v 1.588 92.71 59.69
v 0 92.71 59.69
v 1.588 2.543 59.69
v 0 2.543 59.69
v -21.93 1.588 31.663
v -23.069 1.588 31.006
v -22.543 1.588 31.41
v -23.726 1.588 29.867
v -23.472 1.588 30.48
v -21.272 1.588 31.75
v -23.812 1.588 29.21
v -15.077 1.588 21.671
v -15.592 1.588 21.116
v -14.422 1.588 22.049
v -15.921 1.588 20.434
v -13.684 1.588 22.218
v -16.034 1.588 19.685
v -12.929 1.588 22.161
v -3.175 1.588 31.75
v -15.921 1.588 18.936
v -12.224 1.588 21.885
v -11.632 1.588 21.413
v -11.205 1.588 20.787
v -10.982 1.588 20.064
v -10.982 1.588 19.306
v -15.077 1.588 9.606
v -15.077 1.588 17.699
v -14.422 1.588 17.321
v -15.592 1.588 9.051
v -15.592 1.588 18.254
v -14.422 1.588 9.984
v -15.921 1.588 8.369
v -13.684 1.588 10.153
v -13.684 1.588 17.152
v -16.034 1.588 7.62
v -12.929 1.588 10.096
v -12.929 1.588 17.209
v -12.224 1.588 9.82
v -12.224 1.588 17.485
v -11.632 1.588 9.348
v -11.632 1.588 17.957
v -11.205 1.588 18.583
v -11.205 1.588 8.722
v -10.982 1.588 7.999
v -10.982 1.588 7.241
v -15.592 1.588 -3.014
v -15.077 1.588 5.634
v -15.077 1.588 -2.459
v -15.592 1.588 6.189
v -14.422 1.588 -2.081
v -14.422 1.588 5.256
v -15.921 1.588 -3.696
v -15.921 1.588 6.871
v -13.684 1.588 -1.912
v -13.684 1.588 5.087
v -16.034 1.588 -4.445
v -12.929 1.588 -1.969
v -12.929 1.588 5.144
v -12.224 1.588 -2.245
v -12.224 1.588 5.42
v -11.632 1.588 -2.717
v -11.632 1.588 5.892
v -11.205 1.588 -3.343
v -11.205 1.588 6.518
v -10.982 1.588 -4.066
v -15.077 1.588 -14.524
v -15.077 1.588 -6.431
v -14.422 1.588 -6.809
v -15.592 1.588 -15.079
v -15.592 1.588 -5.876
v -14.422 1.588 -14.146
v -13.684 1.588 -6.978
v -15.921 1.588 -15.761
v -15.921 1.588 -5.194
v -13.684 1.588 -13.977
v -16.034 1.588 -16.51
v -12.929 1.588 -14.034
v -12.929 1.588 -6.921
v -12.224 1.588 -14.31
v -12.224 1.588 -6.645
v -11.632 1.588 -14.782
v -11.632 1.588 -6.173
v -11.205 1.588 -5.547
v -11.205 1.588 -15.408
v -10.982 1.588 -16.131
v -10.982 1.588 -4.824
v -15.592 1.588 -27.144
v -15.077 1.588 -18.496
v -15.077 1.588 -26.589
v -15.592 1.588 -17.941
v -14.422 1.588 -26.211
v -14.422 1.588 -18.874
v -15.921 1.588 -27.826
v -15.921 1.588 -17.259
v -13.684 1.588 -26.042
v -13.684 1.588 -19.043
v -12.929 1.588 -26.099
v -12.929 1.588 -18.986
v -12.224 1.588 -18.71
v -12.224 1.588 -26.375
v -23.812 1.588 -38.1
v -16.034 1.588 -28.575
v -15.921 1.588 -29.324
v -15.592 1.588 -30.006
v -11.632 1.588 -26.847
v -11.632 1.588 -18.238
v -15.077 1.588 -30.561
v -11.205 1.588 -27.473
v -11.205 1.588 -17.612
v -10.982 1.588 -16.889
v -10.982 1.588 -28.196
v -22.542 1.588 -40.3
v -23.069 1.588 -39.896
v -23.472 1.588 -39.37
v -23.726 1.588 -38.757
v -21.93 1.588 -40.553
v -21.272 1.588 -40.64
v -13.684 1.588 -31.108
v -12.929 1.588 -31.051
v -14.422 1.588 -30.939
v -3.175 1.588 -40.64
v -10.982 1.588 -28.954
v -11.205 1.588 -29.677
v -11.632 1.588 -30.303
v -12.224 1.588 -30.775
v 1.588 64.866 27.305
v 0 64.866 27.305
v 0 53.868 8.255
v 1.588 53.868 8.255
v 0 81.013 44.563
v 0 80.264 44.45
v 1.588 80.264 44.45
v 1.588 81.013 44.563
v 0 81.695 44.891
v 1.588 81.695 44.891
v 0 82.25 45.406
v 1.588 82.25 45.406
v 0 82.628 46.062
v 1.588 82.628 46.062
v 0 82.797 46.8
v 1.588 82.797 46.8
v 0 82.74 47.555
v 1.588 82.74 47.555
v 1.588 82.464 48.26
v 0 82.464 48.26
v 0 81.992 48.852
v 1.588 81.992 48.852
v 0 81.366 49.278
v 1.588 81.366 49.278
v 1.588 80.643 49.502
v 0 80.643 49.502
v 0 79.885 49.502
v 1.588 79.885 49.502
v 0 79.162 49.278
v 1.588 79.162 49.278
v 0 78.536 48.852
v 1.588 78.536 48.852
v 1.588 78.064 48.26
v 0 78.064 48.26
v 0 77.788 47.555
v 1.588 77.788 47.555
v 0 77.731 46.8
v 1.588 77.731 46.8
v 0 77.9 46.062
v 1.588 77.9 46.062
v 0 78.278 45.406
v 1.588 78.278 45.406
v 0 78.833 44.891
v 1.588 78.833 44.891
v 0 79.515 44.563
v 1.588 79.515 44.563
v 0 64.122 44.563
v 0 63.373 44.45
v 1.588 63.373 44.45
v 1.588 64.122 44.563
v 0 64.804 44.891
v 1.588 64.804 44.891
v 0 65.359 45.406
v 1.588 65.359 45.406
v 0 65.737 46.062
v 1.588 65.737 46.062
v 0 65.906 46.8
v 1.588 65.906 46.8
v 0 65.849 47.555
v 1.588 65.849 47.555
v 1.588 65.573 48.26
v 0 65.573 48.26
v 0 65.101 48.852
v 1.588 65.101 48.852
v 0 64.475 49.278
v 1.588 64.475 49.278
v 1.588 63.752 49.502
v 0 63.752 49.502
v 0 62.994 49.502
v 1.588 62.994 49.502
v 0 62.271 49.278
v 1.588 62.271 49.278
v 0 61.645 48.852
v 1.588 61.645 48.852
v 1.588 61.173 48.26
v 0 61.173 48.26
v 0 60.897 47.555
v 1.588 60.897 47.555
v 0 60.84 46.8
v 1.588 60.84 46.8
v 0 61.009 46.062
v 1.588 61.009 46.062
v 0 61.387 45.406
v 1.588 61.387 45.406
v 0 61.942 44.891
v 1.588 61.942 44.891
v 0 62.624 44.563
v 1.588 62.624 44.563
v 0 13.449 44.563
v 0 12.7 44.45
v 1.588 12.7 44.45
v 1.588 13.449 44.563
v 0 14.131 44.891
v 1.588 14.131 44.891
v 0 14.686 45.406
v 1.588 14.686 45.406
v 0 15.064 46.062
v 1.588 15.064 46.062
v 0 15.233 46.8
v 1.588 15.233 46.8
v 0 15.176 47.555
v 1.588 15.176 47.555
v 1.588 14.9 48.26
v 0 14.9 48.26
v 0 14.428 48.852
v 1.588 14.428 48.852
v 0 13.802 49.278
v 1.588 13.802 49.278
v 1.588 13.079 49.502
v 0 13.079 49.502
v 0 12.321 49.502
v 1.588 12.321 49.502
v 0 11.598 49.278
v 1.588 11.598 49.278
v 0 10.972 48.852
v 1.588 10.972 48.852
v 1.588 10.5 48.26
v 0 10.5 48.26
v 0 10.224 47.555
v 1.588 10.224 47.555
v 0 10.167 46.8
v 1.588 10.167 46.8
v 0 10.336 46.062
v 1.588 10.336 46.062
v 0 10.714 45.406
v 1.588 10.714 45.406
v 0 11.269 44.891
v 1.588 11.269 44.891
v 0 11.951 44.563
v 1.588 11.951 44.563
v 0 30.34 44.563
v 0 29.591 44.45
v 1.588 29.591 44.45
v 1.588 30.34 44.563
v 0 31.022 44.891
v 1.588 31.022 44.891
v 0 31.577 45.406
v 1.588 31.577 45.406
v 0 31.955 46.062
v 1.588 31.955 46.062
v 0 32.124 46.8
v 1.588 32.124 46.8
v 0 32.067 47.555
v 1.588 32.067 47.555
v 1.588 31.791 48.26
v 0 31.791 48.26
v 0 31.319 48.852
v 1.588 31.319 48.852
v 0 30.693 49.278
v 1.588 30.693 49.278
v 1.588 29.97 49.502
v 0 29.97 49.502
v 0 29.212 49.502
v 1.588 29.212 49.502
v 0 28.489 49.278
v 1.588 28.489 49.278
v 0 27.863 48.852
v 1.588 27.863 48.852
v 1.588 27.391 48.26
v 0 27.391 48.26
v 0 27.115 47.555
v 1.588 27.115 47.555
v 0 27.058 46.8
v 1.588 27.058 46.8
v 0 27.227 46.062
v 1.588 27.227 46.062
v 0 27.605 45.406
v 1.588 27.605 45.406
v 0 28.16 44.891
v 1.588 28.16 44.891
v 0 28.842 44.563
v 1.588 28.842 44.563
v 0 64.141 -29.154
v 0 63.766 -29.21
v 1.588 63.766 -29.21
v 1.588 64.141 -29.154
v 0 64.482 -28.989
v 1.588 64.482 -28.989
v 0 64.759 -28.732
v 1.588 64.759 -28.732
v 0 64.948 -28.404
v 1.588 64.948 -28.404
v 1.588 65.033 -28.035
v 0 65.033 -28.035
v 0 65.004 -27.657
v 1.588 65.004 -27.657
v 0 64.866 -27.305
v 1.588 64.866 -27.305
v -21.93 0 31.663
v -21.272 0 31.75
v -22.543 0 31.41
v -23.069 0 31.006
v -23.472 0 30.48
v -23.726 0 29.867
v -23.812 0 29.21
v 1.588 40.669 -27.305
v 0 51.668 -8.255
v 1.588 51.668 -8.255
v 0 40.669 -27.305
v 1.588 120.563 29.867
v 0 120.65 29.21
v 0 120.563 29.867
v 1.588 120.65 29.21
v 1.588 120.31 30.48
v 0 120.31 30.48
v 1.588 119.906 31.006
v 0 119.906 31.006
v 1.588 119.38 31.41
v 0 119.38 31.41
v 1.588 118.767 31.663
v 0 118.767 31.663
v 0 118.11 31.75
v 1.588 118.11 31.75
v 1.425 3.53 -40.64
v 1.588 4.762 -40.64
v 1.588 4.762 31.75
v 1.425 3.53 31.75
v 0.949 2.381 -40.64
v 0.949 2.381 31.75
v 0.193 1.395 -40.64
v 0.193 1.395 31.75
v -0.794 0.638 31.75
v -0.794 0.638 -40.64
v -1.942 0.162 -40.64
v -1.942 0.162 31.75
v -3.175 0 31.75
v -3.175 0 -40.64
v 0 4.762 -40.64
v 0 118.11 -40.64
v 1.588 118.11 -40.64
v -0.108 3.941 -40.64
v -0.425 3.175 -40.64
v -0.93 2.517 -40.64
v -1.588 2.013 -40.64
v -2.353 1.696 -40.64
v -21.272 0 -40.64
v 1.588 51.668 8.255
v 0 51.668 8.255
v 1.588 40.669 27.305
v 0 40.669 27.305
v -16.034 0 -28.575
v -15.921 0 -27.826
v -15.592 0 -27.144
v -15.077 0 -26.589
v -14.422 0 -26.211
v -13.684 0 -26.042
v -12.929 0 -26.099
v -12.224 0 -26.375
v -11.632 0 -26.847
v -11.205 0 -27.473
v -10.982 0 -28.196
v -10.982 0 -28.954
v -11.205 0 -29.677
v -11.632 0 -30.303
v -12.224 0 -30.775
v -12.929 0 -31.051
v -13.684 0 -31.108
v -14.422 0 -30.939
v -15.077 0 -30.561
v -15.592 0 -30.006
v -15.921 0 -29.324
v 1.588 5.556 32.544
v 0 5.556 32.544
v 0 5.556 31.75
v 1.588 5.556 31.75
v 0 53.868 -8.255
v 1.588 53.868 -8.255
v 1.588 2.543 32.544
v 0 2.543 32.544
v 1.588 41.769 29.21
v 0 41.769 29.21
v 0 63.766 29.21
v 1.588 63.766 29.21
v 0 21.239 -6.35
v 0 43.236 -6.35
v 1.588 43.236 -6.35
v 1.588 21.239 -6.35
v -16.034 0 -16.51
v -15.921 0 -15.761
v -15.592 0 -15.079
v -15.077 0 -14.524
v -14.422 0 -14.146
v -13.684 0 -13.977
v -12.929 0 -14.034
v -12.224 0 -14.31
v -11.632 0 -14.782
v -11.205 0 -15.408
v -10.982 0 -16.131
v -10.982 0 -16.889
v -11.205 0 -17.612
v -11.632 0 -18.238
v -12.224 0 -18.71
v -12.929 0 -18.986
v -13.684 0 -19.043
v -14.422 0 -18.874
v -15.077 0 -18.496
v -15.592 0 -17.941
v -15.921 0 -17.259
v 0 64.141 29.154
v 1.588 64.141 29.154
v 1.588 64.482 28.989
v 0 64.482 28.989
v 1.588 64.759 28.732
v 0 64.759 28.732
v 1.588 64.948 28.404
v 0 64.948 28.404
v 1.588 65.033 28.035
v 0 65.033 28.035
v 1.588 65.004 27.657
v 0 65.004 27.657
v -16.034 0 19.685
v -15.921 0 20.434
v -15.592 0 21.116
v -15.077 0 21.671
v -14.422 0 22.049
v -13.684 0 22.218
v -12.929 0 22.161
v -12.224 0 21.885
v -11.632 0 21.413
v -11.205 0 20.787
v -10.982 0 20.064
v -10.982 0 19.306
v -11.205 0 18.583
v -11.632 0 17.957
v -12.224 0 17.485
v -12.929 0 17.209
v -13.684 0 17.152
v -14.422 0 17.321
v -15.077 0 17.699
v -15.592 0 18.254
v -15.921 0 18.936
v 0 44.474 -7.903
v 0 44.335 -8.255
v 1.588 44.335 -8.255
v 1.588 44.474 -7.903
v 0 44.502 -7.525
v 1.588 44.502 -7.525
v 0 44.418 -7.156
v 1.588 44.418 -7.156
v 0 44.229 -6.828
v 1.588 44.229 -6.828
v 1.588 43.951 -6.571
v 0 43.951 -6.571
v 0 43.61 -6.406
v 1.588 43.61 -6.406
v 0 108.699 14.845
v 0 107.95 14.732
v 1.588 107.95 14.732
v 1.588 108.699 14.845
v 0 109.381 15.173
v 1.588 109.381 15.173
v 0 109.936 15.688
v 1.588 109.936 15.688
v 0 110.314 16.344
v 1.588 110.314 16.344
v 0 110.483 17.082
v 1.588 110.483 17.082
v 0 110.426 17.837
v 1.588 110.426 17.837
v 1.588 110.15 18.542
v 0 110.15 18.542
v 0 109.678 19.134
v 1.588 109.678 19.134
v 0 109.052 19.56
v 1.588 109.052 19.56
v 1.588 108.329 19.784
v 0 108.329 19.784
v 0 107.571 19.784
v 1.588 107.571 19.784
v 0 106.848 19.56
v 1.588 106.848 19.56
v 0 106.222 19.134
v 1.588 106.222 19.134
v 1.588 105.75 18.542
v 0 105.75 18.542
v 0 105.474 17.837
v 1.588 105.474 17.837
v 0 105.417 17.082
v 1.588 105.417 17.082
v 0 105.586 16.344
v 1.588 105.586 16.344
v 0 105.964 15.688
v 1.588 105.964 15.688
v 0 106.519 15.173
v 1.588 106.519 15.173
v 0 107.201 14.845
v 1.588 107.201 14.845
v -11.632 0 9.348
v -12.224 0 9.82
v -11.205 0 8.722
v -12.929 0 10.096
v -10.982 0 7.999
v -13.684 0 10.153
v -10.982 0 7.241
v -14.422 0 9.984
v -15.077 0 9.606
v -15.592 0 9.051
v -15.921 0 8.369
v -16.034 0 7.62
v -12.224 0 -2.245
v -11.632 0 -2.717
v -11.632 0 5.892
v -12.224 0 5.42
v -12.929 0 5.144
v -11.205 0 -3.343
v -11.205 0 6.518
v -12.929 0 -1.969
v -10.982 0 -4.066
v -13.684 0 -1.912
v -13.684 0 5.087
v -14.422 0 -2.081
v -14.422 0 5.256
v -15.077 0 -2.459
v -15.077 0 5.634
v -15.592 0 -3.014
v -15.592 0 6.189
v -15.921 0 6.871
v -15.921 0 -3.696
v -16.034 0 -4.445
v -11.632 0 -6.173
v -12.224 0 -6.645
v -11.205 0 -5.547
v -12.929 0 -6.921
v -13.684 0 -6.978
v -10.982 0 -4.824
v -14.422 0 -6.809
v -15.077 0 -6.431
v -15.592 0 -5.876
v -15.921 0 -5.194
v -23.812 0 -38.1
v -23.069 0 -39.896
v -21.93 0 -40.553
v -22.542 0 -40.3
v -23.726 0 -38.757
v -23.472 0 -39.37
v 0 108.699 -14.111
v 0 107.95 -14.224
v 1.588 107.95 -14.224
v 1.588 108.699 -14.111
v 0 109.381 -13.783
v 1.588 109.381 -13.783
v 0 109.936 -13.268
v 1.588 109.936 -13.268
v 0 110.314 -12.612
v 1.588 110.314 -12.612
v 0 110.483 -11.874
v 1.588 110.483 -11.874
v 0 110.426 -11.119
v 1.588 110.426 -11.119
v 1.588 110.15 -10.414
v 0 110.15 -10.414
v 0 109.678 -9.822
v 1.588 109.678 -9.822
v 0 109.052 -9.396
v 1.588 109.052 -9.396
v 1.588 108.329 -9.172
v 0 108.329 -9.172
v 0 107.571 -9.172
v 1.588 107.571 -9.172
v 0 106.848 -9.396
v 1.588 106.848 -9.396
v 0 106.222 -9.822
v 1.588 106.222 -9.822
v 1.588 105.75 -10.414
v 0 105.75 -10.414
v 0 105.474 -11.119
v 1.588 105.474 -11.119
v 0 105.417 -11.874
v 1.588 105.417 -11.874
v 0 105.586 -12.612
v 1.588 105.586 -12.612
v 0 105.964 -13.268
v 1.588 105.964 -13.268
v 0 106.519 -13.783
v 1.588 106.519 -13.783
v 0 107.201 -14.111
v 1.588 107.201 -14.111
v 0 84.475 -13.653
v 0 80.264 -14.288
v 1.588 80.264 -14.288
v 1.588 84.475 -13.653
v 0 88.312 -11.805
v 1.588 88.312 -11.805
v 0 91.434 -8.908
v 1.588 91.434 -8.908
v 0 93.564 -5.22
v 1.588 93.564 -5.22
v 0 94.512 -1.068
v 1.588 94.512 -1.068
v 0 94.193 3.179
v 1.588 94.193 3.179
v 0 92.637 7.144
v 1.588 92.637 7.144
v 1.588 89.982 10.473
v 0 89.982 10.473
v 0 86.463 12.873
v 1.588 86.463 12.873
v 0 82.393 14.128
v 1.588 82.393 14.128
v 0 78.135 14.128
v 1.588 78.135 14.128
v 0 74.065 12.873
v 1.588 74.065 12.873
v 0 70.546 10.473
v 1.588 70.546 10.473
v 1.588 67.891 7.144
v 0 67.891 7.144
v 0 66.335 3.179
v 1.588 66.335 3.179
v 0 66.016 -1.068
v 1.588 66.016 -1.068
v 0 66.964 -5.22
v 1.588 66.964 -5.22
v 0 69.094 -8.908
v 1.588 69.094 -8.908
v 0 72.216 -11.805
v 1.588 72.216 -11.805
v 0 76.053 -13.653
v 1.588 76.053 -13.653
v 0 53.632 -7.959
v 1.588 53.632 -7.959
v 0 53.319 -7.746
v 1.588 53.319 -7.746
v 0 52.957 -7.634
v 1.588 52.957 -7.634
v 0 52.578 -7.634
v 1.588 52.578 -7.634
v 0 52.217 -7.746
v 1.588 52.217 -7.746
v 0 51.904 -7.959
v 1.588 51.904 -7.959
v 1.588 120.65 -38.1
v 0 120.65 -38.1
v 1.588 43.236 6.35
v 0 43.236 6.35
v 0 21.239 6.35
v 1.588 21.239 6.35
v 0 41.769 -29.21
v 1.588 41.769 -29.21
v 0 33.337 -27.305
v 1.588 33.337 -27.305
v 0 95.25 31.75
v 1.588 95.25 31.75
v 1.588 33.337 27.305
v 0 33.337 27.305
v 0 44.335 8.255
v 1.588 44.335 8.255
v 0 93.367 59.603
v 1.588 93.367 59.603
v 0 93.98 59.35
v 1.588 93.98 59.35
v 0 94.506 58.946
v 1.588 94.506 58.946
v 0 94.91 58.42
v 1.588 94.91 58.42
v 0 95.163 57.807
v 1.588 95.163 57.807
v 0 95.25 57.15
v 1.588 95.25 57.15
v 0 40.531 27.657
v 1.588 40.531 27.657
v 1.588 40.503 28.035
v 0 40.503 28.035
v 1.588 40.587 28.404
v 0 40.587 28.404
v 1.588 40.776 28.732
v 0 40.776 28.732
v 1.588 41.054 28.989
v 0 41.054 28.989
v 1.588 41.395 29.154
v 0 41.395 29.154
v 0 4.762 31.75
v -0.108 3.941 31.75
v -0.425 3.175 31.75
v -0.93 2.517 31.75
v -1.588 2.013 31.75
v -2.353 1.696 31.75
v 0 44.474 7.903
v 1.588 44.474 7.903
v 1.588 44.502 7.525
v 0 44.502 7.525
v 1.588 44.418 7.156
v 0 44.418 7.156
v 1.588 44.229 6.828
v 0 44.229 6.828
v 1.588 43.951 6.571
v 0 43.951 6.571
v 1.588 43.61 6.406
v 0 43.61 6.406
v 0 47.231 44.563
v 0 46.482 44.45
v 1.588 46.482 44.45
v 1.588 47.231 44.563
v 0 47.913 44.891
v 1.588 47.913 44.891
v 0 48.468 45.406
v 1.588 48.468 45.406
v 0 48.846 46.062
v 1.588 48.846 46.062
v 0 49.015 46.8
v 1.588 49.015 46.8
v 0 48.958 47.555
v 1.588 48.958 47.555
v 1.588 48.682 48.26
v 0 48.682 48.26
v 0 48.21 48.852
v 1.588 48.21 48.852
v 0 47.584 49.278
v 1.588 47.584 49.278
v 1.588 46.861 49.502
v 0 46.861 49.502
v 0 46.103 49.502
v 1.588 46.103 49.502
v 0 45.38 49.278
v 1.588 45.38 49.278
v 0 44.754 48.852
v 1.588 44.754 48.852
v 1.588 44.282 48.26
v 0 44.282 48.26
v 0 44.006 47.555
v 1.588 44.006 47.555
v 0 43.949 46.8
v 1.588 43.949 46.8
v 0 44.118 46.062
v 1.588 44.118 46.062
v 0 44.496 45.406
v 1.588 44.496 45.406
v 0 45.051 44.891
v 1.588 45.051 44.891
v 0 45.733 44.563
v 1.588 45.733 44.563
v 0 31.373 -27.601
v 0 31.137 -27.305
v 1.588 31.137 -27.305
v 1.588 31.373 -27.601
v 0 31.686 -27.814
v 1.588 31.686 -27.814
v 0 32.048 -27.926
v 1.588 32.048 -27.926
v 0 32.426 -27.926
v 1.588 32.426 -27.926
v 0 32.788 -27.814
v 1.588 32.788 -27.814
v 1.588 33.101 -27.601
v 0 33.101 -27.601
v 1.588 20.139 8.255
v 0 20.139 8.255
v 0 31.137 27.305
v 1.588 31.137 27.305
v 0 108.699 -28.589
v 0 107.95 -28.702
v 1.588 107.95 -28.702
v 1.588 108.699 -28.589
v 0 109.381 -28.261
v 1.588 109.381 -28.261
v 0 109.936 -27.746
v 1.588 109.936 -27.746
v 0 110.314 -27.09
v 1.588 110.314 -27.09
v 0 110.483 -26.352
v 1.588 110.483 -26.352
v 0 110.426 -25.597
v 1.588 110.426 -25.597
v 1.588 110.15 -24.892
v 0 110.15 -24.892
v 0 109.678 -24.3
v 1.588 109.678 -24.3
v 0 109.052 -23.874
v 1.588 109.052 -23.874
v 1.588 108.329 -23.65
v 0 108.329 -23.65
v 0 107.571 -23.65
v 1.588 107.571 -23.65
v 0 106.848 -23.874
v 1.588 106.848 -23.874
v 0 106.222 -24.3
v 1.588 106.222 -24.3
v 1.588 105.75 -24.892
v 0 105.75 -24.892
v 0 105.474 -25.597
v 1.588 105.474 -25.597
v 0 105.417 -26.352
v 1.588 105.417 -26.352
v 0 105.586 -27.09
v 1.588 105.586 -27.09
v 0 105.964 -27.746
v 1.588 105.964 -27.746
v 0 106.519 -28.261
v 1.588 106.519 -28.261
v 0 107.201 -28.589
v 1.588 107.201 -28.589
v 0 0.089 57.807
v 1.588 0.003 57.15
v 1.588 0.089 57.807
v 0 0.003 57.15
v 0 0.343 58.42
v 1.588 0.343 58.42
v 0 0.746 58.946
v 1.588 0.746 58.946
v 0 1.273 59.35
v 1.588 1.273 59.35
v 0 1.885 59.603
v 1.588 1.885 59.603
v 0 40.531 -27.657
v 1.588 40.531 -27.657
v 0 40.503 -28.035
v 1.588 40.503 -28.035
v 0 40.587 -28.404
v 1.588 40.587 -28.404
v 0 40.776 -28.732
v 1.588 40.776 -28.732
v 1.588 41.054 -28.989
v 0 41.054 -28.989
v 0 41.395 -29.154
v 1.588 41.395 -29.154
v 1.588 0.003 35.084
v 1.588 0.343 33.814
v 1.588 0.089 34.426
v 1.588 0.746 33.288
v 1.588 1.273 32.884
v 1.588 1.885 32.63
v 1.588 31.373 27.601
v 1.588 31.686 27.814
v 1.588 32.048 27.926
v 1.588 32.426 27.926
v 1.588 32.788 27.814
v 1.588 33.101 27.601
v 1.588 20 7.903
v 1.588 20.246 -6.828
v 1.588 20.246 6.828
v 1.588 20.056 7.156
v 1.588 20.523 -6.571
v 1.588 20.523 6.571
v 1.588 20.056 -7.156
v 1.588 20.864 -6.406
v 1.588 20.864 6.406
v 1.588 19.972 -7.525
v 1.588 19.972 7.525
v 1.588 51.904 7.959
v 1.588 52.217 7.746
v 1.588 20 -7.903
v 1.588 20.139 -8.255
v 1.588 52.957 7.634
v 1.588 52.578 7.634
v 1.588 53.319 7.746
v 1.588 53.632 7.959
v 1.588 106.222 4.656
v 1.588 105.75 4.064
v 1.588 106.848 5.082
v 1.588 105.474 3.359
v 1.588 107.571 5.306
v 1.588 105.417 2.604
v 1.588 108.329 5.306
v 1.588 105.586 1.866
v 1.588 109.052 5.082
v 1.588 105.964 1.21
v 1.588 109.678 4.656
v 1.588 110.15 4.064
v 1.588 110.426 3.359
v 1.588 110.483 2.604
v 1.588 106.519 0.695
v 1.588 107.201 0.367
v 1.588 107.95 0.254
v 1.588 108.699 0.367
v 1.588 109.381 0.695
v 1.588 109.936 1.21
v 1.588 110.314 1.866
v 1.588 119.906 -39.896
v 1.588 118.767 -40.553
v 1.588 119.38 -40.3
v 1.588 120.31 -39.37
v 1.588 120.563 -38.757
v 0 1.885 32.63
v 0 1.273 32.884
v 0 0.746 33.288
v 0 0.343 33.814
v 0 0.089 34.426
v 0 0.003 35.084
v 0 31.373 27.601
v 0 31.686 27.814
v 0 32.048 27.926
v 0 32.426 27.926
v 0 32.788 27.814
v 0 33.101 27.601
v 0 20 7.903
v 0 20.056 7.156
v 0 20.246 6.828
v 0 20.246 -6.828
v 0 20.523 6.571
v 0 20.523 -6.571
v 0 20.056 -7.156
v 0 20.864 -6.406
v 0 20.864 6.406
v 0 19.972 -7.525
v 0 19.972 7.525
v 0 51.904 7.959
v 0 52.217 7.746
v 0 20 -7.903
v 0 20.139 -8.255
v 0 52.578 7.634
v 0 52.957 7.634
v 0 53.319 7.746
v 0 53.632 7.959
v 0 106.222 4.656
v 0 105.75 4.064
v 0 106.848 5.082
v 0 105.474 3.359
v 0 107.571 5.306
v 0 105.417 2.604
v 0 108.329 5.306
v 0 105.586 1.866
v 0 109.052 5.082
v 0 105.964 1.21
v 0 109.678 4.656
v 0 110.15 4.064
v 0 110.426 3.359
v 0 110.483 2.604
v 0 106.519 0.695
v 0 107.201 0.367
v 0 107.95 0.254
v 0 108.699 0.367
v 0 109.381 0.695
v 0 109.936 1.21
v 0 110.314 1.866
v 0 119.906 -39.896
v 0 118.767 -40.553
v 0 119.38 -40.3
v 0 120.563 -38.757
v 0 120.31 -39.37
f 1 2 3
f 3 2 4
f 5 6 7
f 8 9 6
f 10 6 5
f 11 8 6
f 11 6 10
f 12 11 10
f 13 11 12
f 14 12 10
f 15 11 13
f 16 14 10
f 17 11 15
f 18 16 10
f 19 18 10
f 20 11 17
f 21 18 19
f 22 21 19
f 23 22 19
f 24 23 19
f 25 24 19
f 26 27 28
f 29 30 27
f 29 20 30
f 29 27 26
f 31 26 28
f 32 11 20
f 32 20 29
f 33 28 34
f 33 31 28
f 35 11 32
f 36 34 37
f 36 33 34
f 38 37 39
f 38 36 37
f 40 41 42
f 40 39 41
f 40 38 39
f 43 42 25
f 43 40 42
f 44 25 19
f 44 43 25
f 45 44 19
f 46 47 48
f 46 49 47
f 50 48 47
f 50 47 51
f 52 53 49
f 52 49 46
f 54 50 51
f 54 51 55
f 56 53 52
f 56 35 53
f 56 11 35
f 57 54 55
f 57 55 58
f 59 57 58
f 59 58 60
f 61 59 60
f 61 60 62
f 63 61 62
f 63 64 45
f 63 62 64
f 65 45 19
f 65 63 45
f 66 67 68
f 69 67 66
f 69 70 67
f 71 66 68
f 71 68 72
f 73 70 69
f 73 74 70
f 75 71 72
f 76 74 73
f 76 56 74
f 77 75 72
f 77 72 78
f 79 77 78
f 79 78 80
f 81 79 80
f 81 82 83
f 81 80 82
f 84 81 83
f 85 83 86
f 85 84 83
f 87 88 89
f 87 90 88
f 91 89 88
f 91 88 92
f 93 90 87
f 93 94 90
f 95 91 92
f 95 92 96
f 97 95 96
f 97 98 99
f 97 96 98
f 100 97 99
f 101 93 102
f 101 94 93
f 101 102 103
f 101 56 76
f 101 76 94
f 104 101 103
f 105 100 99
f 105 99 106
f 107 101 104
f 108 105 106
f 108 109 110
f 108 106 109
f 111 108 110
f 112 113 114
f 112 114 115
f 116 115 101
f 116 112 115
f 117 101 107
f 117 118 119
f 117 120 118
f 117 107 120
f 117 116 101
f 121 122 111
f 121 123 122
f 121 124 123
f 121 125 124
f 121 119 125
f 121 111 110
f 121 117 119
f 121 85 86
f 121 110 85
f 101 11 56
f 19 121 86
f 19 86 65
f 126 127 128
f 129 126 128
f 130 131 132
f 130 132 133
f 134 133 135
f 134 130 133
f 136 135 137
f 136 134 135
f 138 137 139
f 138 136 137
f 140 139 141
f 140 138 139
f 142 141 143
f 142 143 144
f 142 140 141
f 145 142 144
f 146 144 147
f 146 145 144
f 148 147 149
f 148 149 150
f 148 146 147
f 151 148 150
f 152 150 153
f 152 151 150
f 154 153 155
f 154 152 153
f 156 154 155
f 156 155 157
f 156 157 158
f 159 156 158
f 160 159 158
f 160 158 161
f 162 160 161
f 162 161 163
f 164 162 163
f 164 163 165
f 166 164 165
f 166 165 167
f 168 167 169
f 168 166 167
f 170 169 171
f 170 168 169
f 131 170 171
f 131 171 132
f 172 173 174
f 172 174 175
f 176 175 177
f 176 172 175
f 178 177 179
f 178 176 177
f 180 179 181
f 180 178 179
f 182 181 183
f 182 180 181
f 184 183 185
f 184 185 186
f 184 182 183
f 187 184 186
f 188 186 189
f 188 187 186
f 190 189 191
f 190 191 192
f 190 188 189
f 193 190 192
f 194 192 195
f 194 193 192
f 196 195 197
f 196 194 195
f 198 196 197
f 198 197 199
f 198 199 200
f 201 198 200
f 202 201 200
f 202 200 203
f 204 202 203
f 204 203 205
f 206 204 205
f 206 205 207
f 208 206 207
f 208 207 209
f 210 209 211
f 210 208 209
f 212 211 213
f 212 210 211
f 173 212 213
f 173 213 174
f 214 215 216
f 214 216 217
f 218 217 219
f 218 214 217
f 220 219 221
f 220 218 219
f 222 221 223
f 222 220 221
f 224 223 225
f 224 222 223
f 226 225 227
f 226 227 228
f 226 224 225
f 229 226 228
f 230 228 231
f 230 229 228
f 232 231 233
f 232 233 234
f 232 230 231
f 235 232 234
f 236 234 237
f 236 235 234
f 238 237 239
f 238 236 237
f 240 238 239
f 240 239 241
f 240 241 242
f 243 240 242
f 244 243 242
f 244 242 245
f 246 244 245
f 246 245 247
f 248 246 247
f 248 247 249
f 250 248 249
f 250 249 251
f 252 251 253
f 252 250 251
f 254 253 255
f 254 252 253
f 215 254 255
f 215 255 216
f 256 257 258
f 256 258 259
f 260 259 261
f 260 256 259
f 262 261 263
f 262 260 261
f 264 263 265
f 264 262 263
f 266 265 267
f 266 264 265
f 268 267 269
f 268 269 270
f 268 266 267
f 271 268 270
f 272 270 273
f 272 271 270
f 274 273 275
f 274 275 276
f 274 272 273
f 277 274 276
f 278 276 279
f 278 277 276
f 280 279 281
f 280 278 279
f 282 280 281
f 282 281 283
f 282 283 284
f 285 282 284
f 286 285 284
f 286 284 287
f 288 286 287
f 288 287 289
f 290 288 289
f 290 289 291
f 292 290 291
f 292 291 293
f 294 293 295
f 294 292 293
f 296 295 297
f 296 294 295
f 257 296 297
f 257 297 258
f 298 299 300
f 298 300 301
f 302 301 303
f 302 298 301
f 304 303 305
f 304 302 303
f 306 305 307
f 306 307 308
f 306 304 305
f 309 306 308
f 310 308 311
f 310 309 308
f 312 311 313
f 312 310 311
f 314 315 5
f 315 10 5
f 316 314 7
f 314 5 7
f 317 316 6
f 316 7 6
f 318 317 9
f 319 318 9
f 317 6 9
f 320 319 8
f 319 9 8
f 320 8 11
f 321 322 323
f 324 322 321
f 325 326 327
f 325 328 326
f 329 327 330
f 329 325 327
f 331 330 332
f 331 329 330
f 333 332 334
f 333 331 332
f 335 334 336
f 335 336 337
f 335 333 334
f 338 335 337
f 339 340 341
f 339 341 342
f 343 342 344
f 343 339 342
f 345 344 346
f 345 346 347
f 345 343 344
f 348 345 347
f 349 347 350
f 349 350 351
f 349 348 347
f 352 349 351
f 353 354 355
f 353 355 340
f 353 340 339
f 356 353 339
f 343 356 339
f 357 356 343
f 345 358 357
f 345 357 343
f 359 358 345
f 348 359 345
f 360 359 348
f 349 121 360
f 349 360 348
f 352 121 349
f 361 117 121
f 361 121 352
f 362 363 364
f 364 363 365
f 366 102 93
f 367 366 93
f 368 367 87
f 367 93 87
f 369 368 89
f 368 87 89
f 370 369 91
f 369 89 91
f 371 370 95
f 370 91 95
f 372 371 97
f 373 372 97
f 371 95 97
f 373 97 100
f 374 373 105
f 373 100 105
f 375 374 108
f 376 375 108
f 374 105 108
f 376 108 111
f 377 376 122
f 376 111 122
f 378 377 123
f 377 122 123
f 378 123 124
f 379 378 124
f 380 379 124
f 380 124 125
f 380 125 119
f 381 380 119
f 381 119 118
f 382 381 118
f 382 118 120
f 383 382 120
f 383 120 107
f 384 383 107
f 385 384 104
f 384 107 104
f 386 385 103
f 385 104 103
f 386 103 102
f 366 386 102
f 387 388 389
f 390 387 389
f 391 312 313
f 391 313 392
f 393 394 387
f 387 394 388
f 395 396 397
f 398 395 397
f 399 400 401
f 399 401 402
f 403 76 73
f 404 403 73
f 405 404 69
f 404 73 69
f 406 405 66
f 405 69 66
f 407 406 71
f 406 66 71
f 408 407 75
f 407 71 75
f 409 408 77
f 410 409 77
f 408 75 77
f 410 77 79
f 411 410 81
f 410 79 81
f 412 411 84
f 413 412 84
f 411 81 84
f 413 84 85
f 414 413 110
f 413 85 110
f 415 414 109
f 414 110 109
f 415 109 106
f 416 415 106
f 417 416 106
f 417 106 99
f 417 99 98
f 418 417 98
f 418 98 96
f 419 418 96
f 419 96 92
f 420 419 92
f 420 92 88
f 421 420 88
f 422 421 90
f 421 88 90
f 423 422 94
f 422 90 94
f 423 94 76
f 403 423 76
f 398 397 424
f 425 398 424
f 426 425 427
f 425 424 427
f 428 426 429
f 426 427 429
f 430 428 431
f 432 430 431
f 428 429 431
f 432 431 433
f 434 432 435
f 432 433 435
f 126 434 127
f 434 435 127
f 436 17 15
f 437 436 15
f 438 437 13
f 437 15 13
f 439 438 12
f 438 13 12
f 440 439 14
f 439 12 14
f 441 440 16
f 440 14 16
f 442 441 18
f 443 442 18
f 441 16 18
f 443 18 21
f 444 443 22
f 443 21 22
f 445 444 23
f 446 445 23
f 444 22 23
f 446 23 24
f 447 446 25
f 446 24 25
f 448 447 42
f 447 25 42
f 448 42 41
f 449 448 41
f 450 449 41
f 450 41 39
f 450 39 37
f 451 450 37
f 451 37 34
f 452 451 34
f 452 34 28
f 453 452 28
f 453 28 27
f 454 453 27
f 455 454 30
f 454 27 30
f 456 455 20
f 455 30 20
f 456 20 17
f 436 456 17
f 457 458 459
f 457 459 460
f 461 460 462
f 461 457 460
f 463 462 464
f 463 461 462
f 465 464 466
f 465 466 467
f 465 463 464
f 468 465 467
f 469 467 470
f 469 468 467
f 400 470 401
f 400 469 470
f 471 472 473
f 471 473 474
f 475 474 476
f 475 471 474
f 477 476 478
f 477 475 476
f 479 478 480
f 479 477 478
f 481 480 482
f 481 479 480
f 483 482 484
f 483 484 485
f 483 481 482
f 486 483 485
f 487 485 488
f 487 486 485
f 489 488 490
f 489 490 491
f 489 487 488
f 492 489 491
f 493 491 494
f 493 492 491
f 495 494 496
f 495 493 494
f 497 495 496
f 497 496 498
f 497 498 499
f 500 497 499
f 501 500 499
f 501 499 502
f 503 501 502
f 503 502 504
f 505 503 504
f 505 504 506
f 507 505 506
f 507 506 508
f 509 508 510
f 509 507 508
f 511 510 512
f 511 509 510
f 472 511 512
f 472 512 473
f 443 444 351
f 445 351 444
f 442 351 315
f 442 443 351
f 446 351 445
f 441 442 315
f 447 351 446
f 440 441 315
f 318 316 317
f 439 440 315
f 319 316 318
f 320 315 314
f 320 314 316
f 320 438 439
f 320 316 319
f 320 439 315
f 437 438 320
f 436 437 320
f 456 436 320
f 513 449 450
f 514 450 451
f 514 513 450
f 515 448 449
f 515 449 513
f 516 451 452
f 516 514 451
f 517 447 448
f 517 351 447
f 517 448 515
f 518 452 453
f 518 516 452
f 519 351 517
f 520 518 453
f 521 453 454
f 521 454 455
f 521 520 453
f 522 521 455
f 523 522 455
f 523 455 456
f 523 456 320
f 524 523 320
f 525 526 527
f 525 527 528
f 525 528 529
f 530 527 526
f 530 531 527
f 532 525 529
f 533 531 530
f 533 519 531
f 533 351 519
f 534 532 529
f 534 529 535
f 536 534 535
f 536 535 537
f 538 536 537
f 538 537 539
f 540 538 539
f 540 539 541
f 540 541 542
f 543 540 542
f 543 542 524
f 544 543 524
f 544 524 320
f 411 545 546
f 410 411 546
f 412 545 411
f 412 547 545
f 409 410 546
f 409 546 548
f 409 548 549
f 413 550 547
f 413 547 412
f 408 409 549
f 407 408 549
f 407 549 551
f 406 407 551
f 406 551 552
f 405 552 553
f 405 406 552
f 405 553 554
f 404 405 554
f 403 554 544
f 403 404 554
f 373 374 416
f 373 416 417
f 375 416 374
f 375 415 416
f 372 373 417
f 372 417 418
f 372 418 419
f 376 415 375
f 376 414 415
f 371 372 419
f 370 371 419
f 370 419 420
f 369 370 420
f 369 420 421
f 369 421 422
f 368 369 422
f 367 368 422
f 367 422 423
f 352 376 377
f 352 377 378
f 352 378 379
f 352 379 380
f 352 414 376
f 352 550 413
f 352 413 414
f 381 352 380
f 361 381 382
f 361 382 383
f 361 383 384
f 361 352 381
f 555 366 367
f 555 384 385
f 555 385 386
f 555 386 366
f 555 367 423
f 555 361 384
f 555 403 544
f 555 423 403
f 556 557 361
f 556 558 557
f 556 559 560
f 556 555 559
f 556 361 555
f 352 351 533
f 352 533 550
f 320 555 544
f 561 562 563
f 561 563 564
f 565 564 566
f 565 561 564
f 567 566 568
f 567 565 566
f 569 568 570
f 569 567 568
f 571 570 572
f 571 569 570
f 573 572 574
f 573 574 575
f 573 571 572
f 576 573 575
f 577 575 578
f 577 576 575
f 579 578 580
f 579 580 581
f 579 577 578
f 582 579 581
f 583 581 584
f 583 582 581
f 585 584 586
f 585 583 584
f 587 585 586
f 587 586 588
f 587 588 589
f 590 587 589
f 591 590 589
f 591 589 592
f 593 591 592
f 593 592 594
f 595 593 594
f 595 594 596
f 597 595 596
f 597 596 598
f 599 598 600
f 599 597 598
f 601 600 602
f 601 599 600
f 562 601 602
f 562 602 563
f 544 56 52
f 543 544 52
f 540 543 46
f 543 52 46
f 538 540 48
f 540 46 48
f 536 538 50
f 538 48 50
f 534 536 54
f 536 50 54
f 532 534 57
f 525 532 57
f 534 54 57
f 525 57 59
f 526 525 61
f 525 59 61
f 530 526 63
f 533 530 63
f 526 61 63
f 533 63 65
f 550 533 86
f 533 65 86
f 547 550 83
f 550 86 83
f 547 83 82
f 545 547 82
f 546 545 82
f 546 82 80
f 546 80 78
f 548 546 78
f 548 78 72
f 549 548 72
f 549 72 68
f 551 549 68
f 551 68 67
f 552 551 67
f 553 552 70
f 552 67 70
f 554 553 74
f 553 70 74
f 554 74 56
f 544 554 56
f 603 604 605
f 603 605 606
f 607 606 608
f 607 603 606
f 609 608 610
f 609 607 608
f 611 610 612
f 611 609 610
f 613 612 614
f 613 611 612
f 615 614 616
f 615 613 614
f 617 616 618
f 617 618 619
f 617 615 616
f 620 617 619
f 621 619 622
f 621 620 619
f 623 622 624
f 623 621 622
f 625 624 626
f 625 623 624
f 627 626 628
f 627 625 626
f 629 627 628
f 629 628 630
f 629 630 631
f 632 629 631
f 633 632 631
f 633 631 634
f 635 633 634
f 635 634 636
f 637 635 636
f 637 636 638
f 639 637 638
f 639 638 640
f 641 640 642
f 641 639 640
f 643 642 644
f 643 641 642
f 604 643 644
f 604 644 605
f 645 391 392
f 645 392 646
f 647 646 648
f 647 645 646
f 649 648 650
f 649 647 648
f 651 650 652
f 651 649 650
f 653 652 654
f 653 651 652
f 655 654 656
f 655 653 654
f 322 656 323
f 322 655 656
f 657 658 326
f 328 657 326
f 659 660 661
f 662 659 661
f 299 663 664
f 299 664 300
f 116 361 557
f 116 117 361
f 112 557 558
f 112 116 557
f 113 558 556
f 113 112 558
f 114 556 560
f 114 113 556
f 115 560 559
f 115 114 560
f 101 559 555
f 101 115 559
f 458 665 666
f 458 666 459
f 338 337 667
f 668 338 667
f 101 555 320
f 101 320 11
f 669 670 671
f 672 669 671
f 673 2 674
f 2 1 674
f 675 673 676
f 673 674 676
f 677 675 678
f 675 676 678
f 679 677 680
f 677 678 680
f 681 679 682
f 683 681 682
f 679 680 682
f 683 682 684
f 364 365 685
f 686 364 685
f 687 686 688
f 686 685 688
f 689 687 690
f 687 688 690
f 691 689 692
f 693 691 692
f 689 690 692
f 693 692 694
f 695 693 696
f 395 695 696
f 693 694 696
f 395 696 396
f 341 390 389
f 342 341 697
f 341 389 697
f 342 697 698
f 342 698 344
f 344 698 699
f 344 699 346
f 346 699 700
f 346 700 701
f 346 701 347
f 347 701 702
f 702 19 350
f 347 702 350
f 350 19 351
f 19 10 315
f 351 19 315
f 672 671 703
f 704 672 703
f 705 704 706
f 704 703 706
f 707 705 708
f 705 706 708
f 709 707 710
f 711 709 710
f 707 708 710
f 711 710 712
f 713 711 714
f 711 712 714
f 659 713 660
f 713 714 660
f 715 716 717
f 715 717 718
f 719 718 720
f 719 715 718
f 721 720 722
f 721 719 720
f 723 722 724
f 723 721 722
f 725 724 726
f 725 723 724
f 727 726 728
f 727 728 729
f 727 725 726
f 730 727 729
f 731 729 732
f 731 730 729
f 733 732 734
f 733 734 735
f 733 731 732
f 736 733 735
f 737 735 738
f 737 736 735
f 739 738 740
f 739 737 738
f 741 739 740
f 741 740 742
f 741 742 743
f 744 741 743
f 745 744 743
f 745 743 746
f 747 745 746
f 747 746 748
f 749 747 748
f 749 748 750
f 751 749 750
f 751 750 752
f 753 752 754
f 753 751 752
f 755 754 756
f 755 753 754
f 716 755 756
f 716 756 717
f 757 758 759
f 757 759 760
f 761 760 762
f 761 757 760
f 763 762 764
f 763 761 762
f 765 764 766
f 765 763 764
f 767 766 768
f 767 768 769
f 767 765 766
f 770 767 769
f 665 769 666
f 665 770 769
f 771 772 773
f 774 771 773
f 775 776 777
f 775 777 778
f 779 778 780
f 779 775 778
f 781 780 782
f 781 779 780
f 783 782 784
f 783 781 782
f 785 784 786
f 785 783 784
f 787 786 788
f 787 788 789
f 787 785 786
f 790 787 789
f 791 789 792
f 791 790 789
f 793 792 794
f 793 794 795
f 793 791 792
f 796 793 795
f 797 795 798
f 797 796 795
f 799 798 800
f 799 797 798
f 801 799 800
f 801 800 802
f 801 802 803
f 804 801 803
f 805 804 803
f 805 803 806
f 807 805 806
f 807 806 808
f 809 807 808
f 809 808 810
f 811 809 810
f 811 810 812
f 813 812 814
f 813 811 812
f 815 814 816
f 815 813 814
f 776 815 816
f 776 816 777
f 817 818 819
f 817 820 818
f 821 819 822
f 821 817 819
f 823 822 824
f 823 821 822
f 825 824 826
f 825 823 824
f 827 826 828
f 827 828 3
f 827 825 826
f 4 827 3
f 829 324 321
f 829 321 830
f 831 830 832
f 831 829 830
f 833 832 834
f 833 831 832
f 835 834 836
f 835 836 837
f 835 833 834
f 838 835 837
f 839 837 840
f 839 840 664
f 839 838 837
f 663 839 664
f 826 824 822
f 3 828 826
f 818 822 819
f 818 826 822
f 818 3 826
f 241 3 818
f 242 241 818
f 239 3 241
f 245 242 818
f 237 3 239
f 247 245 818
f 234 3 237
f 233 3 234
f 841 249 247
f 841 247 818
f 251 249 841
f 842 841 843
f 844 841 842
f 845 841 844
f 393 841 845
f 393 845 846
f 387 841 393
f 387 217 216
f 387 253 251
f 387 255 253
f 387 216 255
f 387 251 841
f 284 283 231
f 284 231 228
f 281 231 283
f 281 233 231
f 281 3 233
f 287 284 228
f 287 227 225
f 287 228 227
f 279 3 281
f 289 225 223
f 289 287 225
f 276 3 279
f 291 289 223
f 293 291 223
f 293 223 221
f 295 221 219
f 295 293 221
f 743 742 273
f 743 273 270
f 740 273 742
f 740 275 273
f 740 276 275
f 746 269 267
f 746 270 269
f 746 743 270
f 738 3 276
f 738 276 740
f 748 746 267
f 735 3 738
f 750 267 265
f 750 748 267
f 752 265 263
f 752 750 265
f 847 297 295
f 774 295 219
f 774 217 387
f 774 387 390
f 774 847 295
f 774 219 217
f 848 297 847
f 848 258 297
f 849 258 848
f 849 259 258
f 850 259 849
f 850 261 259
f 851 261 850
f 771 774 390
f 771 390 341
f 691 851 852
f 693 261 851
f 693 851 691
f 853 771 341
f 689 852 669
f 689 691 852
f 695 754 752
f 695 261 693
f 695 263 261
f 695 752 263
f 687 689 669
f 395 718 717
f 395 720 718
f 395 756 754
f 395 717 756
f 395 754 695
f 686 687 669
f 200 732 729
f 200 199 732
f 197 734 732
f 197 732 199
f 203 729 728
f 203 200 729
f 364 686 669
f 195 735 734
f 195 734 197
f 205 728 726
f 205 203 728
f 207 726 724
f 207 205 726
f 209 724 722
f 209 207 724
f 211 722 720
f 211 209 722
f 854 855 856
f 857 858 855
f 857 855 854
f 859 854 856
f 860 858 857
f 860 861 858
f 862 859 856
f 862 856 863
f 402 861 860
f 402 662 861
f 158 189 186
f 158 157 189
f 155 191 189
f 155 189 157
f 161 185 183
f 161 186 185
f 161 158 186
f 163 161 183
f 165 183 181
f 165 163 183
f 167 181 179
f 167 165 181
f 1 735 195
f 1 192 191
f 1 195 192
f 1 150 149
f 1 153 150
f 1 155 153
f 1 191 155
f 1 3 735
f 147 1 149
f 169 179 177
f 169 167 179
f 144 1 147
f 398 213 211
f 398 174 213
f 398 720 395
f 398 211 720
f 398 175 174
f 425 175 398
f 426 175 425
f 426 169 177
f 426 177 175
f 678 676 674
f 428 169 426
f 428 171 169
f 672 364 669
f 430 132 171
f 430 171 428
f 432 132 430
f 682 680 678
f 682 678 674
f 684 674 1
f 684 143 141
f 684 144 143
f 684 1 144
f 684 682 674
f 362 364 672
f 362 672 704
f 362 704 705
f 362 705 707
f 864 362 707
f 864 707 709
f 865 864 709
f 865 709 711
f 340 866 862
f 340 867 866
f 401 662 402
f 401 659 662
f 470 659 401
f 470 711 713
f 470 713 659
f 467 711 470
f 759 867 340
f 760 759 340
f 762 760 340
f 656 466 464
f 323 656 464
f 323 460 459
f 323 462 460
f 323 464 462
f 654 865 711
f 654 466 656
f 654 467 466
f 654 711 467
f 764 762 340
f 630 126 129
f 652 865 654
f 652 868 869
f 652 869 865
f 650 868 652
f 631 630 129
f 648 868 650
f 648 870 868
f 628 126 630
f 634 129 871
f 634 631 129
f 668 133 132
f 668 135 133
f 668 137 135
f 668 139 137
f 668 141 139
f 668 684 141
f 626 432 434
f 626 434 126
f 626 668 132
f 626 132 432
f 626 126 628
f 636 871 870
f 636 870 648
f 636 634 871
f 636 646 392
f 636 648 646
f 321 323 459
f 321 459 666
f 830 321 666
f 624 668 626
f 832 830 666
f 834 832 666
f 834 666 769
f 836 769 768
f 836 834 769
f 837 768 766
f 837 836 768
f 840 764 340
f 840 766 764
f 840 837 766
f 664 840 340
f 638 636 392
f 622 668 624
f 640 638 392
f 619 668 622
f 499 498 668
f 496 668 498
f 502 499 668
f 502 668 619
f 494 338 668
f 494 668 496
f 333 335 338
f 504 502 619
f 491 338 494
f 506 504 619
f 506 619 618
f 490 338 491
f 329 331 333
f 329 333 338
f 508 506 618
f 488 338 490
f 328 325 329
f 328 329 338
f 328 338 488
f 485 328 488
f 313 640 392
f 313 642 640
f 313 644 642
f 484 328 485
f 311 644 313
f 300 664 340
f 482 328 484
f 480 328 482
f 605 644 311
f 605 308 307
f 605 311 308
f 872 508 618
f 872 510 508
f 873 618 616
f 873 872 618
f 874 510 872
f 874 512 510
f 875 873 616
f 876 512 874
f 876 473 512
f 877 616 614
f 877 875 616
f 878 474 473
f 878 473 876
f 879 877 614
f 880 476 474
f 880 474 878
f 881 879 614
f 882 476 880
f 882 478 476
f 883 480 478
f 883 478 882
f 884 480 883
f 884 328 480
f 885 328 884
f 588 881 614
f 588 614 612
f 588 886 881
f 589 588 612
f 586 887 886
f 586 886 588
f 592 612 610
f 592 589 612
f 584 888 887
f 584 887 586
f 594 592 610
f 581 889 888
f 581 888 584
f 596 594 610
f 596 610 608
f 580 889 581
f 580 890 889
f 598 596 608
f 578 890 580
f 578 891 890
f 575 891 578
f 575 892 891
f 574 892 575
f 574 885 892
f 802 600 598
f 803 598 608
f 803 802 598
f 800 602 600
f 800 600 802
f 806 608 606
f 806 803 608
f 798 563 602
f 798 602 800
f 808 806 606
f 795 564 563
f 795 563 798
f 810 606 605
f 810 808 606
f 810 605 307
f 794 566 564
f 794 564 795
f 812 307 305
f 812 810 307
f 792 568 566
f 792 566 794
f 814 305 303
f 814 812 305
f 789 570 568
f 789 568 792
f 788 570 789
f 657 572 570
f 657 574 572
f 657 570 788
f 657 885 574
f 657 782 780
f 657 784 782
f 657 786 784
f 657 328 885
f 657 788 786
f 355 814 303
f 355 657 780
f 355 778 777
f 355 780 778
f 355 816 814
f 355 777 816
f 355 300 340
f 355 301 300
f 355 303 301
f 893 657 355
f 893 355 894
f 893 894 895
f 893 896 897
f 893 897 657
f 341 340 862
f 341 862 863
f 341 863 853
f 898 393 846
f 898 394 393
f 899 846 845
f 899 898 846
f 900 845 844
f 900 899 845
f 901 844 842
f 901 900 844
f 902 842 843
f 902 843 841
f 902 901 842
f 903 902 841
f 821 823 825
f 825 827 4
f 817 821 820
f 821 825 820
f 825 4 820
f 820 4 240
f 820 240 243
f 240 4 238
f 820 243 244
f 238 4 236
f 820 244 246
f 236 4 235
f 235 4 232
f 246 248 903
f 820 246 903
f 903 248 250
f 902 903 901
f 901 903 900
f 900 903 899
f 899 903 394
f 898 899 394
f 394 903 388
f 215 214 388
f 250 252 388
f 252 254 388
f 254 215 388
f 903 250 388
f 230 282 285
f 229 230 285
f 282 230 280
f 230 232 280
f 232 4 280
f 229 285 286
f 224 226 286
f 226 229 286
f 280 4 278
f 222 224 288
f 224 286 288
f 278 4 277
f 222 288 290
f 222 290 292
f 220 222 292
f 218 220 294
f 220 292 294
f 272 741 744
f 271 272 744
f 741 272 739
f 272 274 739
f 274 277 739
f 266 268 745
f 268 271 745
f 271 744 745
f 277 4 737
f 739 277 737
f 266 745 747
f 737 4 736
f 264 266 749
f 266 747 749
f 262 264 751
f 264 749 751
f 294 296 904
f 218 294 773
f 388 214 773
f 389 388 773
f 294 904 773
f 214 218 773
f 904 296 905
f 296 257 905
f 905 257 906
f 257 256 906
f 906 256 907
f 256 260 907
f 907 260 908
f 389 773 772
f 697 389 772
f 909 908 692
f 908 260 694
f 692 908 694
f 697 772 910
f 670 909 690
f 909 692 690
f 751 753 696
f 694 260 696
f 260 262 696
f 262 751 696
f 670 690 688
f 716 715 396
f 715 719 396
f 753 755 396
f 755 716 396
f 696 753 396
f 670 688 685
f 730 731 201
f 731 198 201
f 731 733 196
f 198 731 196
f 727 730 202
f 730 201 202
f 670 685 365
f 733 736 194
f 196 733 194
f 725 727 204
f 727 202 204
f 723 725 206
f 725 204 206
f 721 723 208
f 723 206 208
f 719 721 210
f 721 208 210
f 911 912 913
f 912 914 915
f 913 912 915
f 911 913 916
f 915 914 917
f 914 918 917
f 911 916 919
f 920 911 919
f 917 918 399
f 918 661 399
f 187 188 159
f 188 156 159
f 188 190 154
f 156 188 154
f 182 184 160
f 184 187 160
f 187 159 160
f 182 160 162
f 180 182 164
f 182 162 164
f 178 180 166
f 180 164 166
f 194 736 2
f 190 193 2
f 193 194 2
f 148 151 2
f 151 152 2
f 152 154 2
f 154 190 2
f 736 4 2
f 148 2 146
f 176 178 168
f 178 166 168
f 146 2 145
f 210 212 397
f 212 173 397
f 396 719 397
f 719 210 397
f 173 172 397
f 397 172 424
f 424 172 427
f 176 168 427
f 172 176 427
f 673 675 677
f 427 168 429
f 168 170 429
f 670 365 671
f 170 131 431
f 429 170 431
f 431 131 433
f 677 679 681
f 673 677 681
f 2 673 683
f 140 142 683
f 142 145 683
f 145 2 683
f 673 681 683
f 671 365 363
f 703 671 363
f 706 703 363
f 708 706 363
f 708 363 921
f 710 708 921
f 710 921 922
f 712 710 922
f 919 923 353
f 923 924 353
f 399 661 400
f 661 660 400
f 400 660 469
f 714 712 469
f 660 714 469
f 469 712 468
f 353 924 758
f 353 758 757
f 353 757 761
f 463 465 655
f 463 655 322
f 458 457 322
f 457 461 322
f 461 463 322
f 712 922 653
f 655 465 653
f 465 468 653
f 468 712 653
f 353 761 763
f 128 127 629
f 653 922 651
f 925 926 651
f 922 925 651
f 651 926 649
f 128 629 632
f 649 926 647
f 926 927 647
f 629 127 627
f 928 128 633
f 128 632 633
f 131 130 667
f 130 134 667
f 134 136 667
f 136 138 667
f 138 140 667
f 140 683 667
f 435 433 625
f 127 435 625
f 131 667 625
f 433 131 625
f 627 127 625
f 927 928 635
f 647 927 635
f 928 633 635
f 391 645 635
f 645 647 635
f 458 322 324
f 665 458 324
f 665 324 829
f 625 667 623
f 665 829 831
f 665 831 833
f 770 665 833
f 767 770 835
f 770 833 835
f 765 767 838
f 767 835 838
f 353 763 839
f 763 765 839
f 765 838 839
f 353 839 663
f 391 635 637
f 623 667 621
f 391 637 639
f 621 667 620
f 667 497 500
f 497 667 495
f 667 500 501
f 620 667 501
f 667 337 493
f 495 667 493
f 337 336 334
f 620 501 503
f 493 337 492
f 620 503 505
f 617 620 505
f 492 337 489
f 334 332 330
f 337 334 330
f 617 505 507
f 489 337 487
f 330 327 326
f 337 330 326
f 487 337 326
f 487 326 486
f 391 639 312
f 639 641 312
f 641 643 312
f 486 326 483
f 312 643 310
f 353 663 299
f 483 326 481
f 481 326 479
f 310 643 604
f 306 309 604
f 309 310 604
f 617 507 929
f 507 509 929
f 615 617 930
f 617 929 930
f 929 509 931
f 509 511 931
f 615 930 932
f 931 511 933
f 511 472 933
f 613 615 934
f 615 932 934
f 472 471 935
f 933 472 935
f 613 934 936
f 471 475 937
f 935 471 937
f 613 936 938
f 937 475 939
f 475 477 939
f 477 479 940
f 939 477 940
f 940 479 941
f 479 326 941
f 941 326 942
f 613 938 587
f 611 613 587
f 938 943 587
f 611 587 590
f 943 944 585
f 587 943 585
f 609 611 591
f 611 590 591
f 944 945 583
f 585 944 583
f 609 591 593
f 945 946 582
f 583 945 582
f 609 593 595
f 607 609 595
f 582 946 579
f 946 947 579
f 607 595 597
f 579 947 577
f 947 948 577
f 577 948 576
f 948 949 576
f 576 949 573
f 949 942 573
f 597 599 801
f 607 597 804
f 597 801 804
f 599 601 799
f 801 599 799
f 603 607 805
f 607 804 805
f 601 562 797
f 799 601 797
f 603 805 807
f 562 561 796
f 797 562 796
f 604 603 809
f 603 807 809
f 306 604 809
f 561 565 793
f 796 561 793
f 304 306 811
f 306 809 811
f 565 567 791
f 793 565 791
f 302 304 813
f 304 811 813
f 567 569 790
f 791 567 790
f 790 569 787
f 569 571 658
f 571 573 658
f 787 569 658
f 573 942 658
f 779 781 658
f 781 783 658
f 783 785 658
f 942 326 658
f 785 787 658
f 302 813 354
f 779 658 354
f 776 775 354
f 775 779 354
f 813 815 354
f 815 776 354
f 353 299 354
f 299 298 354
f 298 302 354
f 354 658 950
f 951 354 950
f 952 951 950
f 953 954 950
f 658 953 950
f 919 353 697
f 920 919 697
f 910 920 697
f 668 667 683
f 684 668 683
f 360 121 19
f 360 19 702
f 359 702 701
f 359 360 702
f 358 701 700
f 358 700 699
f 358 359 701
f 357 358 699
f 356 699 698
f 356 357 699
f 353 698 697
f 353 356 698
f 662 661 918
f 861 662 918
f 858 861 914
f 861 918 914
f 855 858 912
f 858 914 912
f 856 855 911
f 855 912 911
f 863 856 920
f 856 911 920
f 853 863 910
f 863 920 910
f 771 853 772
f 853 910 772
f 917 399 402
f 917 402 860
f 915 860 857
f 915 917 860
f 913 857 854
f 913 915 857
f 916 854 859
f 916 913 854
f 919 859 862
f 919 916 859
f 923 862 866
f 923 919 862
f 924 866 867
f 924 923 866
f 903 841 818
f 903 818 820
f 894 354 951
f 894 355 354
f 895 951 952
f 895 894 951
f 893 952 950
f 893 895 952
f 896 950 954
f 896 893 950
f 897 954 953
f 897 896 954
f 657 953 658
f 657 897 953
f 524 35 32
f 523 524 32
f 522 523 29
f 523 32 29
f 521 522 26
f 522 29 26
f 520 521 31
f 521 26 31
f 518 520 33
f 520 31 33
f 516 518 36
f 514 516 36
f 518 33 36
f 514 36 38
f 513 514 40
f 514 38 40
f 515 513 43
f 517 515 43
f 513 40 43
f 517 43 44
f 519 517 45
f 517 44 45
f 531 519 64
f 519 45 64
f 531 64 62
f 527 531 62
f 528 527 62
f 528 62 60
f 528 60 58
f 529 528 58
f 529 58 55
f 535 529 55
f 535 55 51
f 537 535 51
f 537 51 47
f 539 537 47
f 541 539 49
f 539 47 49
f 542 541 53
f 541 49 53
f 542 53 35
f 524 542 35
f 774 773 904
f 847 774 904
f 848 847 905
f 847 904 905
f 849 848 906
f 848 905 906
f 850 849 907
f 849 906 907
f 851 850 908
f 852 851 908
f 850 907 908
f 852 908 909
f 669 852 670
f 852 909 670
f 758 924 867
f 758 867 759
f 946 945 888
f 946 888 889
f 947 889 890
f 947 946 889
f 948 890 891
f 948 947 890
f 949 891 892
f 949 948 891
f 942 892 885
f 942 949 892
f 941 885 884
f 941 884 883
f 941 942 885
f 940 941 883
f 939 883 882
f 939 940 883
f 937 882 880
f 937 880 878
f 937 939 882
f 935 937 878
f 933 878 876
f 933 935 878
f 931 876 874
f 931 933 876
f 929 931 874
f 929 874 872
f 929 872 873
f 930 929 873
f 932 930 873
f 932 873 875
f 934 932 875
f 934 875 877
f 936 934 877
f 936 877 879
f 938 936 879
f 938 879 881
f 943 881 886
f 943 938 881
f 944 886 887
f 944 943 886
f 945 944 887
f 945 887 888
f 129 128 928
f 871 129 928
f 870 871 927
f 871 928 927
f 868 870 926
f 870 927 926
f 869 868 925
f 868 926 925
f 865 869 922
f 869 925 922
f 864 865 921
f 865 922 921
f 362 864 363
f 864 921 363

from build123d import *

# Parameters (mm, degrees)
SKETCH2_R                     = 14.2875
SKETCH2_R_2                   = 2.54
BOSS_EXTRUDE1_DEPTH           = 1.5875
SKETCH7_W                     = 1.5875
SKETCH7_H                     = 27.94
CUT_EXTRUDE1_DEPTH            = 0.00254
EDGE_FLANGE2_STRIP_W          = 12.7
EDGE_FLANGE2_STRIP_H          = 1.5875
EDGE_FLANGE2_STRIP_CUT_DEPTH  = 72.39
EDGE_FLANGE2_RELIEF_W         = 13.49375
EDGE_FLANGE2_RELIEF_H         = 0.79375
EDGE_FLANGE2_RELIEF_CUT_DEPTH = 1.5875
EDGE_FLANGE2_DEPTH            = 72.39
SKETCH14_R                    = 2.54
CUT_EXTRUDE2_DEPTH            = 1.5875
FILLET1_R                     = 2.54


# Sheet-metal steps are written as plain solids
with BuildPart() as part:
    # Sketch2 → Boss-Extrude1 (new body)
    with BuildSketch(Plane(origin=(0, 0, 0), x_dir=(0, 0, -1), z_dir=(1, 0, 0))):
        Polygon((-59.69, 95.25), (-59.69, 0), (40.64, 0), (40.64, 95.25), (40.64, 120.65), (-31.75, 120.65), (-31.75, 95.25), align=None)
        with Locations((0, 80.264)):
            Circle(SKETCH2_R, mode=Mode.SUBTRACT)
        with Locations((-46.99, 80.264)):
            Circle(SKETCH2_R_2, mode=Mode.SUBTRACT)
        with Locations((-46.99, 63.373)):
            Circle(SKETCH2_R_2, mode=Mode.SUBTRACT)
        with Locations((-17.272, 107.95)):
            Circle(SKETCH2_R_2, mode=Mode.SUBTRACT)
        with Locations((-2.794, 107.95)):
            Circle(SKETCH2_R_2, mode=Mode.SUBTRACT)
        with Locations((11.684, 107.95)):
            Circle(SKETCH2_R_2, mode=Mode.SUBTRACT)
        with Locations((26.162, 107.95)):
            Circle(SKETCH2_R_2, mode=Mode.SUBTRACT)
        with Locations((-46.99, 46.482)):
            Circle(SKETCH2_R_2, mode=Mode.SUBTRACT)
        with Locations((-46.99, 29.591)):
            Circle(SKETCH2_R_2, mode=Mode.SUBTRACT)
        with Locations((-46.99, 12.7)):
            Circle(SKETCH2_R_2, mode=Mode.SUBTRACT)
        with BuildLine():
            Line((-27.305, 64.866068321), (-8.255, 53.867545693))
            ThreePointArc((-8.255, 53.867545693), (-7.62, 52.76769343), (-8.255, 51.667841167))
            Line((-8.255, 51.667841167), (-27.305, 40.669318539))
            ThreePointArc((-27.305, 40.669318539), (-28.575, 40.669318539), (-29.21, 41.769170802))
            Line((-29.21, 41.769170802), (-29.21, 63.766216058))
            ThreePointArc((-29.21, 63.766216058), (-28.575, 64.866068321), (-27.305, 64.866068321))
        make_face(mode=Mode.SUBTRACT)
        with BuildLine():
            Line((-6.35, 43.235640486), (-6.35, 21.238595229))
            ThreePointArc((-6.35, 21.238595229), (-6.985, 20.138742967), (-8.255, 20.138742967))
            Line((-8.255, 20.138742967), (-27.305, 31.137265595))
            ThreePointArc((-27.305, 31.137265595), (-27.94, 32.237117857), (-27.305, 33.33697012))
            Line((-27.305, 33.33697012), (-8.255, 44.335492748))
            ThreePointArc((-8.255, 44.335492748), (-6.985, 44.335492748), (-6.35, 43.235640486))
        make_face(mode=Mode.SUBTRACT)
        with BuildLine():
            Line((8.255, 20.138742967), (27.305, 31.137265595))
            ThreePointArc((27.305, 31.137265595), (27.94, 32.237117857), (27.305, 33.33697012))
            Line((27.305, 33.33697012), (8.255, 44.335492748))
            ThreePointArc((8.255, 44.335492748), (6.985, 44.335492748), (6.35, 43.235640486))
            Line((6.35, 43.235640486), (6.35, 21.238595229))
            ThreePointArc((6.35, 21.238595229), (6.985, 20.138742967), (8.255, 20.138742967))
        make_face(mode=Mode.SUBTRACT)
        with BuildLine():
            Line((8.255, 51.667841167), (27.305, 40.669318539))
            ThreePointArc((27.305, 40.669318539), (28.575, 40.669318539), (29.21, 41.769170802))
            Line((29.21, 41.769170802), (29.21, 63.766216058))
            ThreePointArc((29.21, 63.766216058), (28.575, 64.866068321), (27.305, 64.866068321))
            Line((27.305, 64.866068321), (8.255, 53.867545693))
            ThreePointArc((8.255, 53.867545693), (7.62, 52.76769343), (8.255, 51.667841167))
        make_face(mode=Mode.SUBTRACT)
    extrude(amount=BOSS_EXTRUDE1_DEPTH)

    # Sketch7 → Cut-Extrude1 (cut)
    with BuildSketch(Plane(origin=(0, 0, 0), x_dir=(-1, 0, 0), z_dir=(0, -1, 0))):
        with Locations((-0.79375, -45.72)):
            Rectangle(SKETCH7_W, SKETCH7_H)
    extrude(amount=-CUT_EXTRUDE1_DEPTH, mode=Mode.SUBTRACT)

    # Edge-Flange2 strip (across the edge) → Edge-Flange2 strip cut (cut)
    with BuildSketch(Plane(origin=(0, 0, -40.64), x_dir=(0, 1, 0), z_dir=(0, 0, 1))):
        with Locations((-1.5875, -0.79375)):
            Rectangle(EDGE_FLANGE2_STRIP_W, EDGE_FLANGE2_STRIP_H)
    extrude(amount=EDGE_FLANGE2_STRIP_CUT_DEPTH, mode=Mode.SUBTRACT)

    # Edge-Flange2 relief (on the sheet) → Edge-Flange2 relief cut (cut)
    with BuildSketch(Plane(origin=(0, 4.7625, -40.64), x_dir=(0, 1, 0), z_dir=(-1, 0, 0))):
        with Locations((-5.953125, -72.786875)):
            Rectangle(EDGE_FLANGE2_RELIEF_W, EDGE_FLANGE2_RELIEF_H)
    extrude(amount=-EDGE_FLANGE2_RELIEF_CUT_DEPTH, mode=Mode.SUBTRACT)

    # Edge-Flange2 section (across the edge) → Edge-Flange2 (add)
    with BuildSketch(Plane(origin=(0, 0, -40.64), x_dir=(0, 1, 0), z_dir=(0, 0, 1))):
        with BuildLine():
            Line((0, 3.175), (0, 23.8125))
            Line((0, 23.8125), (1.5875, 23.8125))
            Line((1.5875, 23.8125), (1.5875, 3.175))
            ThreePointArc((1.5875, 3.175), (2.51743597, 0.92993597), (4.7625, 0))
            Line((4.7625, 0), (4.7625, -1.5875))
            ThreePointArc((4.7625, -1.5875), (1.394903955, -0.192596045), (0, 3.175))
        make_face()
    extrude(amount=EDGE_FLANGE2_DEPTH)

    # Sketch14 → Cut-Extrude2 (cut)
    with BuildSketch(Plane(origin=(0, 1.5875, 0), x_dir=(1, 0, 0), z_dir=(0, 1, 0))):
        with Locations(Location((-13.49375, 28.575, 0), (0, 0, 180))):
            Circle(SKETCH14_R)
        with Locations(Location((-13.49375, 16.51, 0), (0, 0, 180))):
            Circle(SKETCH14_R)
        with Locations(Location((-13.49375, 4.445, 0), (0, 0, 180))):
            Circle(SKETCH14_R)
        with Locations(Location((-13.49375, -7.62, 0), (0, 0, 180))):
            Circle(SKETCH14_R)
        with Locations(Location((-13.49375, -19.685, 0), (0, 0, 180))):
            Circle(SKETCH14_R)
    extrude(amount=-CUT_EXTRUDE2_DEPTH, mode=Mode.SUBTRACT)

    # Fillet1
    fillet1_edges = [part.edges().sort_by_distance(p)[0] for p in [
        (0.79375, 0.00254, 32.54375),
        (-23.8125, 0.79375, -40.64),
        (-23.8125, 0.79375, 31.75),
        (0.79375, 120.65, -40.64),
        (0.79375, 95.25, 59.69),
        (0.79375, 120.65, 31.75),
        (0.79375, 0.00254, 59.69),
    ]]
    fillet(fillet1_edges, radius=FILLET1_R)


solid = part.part
